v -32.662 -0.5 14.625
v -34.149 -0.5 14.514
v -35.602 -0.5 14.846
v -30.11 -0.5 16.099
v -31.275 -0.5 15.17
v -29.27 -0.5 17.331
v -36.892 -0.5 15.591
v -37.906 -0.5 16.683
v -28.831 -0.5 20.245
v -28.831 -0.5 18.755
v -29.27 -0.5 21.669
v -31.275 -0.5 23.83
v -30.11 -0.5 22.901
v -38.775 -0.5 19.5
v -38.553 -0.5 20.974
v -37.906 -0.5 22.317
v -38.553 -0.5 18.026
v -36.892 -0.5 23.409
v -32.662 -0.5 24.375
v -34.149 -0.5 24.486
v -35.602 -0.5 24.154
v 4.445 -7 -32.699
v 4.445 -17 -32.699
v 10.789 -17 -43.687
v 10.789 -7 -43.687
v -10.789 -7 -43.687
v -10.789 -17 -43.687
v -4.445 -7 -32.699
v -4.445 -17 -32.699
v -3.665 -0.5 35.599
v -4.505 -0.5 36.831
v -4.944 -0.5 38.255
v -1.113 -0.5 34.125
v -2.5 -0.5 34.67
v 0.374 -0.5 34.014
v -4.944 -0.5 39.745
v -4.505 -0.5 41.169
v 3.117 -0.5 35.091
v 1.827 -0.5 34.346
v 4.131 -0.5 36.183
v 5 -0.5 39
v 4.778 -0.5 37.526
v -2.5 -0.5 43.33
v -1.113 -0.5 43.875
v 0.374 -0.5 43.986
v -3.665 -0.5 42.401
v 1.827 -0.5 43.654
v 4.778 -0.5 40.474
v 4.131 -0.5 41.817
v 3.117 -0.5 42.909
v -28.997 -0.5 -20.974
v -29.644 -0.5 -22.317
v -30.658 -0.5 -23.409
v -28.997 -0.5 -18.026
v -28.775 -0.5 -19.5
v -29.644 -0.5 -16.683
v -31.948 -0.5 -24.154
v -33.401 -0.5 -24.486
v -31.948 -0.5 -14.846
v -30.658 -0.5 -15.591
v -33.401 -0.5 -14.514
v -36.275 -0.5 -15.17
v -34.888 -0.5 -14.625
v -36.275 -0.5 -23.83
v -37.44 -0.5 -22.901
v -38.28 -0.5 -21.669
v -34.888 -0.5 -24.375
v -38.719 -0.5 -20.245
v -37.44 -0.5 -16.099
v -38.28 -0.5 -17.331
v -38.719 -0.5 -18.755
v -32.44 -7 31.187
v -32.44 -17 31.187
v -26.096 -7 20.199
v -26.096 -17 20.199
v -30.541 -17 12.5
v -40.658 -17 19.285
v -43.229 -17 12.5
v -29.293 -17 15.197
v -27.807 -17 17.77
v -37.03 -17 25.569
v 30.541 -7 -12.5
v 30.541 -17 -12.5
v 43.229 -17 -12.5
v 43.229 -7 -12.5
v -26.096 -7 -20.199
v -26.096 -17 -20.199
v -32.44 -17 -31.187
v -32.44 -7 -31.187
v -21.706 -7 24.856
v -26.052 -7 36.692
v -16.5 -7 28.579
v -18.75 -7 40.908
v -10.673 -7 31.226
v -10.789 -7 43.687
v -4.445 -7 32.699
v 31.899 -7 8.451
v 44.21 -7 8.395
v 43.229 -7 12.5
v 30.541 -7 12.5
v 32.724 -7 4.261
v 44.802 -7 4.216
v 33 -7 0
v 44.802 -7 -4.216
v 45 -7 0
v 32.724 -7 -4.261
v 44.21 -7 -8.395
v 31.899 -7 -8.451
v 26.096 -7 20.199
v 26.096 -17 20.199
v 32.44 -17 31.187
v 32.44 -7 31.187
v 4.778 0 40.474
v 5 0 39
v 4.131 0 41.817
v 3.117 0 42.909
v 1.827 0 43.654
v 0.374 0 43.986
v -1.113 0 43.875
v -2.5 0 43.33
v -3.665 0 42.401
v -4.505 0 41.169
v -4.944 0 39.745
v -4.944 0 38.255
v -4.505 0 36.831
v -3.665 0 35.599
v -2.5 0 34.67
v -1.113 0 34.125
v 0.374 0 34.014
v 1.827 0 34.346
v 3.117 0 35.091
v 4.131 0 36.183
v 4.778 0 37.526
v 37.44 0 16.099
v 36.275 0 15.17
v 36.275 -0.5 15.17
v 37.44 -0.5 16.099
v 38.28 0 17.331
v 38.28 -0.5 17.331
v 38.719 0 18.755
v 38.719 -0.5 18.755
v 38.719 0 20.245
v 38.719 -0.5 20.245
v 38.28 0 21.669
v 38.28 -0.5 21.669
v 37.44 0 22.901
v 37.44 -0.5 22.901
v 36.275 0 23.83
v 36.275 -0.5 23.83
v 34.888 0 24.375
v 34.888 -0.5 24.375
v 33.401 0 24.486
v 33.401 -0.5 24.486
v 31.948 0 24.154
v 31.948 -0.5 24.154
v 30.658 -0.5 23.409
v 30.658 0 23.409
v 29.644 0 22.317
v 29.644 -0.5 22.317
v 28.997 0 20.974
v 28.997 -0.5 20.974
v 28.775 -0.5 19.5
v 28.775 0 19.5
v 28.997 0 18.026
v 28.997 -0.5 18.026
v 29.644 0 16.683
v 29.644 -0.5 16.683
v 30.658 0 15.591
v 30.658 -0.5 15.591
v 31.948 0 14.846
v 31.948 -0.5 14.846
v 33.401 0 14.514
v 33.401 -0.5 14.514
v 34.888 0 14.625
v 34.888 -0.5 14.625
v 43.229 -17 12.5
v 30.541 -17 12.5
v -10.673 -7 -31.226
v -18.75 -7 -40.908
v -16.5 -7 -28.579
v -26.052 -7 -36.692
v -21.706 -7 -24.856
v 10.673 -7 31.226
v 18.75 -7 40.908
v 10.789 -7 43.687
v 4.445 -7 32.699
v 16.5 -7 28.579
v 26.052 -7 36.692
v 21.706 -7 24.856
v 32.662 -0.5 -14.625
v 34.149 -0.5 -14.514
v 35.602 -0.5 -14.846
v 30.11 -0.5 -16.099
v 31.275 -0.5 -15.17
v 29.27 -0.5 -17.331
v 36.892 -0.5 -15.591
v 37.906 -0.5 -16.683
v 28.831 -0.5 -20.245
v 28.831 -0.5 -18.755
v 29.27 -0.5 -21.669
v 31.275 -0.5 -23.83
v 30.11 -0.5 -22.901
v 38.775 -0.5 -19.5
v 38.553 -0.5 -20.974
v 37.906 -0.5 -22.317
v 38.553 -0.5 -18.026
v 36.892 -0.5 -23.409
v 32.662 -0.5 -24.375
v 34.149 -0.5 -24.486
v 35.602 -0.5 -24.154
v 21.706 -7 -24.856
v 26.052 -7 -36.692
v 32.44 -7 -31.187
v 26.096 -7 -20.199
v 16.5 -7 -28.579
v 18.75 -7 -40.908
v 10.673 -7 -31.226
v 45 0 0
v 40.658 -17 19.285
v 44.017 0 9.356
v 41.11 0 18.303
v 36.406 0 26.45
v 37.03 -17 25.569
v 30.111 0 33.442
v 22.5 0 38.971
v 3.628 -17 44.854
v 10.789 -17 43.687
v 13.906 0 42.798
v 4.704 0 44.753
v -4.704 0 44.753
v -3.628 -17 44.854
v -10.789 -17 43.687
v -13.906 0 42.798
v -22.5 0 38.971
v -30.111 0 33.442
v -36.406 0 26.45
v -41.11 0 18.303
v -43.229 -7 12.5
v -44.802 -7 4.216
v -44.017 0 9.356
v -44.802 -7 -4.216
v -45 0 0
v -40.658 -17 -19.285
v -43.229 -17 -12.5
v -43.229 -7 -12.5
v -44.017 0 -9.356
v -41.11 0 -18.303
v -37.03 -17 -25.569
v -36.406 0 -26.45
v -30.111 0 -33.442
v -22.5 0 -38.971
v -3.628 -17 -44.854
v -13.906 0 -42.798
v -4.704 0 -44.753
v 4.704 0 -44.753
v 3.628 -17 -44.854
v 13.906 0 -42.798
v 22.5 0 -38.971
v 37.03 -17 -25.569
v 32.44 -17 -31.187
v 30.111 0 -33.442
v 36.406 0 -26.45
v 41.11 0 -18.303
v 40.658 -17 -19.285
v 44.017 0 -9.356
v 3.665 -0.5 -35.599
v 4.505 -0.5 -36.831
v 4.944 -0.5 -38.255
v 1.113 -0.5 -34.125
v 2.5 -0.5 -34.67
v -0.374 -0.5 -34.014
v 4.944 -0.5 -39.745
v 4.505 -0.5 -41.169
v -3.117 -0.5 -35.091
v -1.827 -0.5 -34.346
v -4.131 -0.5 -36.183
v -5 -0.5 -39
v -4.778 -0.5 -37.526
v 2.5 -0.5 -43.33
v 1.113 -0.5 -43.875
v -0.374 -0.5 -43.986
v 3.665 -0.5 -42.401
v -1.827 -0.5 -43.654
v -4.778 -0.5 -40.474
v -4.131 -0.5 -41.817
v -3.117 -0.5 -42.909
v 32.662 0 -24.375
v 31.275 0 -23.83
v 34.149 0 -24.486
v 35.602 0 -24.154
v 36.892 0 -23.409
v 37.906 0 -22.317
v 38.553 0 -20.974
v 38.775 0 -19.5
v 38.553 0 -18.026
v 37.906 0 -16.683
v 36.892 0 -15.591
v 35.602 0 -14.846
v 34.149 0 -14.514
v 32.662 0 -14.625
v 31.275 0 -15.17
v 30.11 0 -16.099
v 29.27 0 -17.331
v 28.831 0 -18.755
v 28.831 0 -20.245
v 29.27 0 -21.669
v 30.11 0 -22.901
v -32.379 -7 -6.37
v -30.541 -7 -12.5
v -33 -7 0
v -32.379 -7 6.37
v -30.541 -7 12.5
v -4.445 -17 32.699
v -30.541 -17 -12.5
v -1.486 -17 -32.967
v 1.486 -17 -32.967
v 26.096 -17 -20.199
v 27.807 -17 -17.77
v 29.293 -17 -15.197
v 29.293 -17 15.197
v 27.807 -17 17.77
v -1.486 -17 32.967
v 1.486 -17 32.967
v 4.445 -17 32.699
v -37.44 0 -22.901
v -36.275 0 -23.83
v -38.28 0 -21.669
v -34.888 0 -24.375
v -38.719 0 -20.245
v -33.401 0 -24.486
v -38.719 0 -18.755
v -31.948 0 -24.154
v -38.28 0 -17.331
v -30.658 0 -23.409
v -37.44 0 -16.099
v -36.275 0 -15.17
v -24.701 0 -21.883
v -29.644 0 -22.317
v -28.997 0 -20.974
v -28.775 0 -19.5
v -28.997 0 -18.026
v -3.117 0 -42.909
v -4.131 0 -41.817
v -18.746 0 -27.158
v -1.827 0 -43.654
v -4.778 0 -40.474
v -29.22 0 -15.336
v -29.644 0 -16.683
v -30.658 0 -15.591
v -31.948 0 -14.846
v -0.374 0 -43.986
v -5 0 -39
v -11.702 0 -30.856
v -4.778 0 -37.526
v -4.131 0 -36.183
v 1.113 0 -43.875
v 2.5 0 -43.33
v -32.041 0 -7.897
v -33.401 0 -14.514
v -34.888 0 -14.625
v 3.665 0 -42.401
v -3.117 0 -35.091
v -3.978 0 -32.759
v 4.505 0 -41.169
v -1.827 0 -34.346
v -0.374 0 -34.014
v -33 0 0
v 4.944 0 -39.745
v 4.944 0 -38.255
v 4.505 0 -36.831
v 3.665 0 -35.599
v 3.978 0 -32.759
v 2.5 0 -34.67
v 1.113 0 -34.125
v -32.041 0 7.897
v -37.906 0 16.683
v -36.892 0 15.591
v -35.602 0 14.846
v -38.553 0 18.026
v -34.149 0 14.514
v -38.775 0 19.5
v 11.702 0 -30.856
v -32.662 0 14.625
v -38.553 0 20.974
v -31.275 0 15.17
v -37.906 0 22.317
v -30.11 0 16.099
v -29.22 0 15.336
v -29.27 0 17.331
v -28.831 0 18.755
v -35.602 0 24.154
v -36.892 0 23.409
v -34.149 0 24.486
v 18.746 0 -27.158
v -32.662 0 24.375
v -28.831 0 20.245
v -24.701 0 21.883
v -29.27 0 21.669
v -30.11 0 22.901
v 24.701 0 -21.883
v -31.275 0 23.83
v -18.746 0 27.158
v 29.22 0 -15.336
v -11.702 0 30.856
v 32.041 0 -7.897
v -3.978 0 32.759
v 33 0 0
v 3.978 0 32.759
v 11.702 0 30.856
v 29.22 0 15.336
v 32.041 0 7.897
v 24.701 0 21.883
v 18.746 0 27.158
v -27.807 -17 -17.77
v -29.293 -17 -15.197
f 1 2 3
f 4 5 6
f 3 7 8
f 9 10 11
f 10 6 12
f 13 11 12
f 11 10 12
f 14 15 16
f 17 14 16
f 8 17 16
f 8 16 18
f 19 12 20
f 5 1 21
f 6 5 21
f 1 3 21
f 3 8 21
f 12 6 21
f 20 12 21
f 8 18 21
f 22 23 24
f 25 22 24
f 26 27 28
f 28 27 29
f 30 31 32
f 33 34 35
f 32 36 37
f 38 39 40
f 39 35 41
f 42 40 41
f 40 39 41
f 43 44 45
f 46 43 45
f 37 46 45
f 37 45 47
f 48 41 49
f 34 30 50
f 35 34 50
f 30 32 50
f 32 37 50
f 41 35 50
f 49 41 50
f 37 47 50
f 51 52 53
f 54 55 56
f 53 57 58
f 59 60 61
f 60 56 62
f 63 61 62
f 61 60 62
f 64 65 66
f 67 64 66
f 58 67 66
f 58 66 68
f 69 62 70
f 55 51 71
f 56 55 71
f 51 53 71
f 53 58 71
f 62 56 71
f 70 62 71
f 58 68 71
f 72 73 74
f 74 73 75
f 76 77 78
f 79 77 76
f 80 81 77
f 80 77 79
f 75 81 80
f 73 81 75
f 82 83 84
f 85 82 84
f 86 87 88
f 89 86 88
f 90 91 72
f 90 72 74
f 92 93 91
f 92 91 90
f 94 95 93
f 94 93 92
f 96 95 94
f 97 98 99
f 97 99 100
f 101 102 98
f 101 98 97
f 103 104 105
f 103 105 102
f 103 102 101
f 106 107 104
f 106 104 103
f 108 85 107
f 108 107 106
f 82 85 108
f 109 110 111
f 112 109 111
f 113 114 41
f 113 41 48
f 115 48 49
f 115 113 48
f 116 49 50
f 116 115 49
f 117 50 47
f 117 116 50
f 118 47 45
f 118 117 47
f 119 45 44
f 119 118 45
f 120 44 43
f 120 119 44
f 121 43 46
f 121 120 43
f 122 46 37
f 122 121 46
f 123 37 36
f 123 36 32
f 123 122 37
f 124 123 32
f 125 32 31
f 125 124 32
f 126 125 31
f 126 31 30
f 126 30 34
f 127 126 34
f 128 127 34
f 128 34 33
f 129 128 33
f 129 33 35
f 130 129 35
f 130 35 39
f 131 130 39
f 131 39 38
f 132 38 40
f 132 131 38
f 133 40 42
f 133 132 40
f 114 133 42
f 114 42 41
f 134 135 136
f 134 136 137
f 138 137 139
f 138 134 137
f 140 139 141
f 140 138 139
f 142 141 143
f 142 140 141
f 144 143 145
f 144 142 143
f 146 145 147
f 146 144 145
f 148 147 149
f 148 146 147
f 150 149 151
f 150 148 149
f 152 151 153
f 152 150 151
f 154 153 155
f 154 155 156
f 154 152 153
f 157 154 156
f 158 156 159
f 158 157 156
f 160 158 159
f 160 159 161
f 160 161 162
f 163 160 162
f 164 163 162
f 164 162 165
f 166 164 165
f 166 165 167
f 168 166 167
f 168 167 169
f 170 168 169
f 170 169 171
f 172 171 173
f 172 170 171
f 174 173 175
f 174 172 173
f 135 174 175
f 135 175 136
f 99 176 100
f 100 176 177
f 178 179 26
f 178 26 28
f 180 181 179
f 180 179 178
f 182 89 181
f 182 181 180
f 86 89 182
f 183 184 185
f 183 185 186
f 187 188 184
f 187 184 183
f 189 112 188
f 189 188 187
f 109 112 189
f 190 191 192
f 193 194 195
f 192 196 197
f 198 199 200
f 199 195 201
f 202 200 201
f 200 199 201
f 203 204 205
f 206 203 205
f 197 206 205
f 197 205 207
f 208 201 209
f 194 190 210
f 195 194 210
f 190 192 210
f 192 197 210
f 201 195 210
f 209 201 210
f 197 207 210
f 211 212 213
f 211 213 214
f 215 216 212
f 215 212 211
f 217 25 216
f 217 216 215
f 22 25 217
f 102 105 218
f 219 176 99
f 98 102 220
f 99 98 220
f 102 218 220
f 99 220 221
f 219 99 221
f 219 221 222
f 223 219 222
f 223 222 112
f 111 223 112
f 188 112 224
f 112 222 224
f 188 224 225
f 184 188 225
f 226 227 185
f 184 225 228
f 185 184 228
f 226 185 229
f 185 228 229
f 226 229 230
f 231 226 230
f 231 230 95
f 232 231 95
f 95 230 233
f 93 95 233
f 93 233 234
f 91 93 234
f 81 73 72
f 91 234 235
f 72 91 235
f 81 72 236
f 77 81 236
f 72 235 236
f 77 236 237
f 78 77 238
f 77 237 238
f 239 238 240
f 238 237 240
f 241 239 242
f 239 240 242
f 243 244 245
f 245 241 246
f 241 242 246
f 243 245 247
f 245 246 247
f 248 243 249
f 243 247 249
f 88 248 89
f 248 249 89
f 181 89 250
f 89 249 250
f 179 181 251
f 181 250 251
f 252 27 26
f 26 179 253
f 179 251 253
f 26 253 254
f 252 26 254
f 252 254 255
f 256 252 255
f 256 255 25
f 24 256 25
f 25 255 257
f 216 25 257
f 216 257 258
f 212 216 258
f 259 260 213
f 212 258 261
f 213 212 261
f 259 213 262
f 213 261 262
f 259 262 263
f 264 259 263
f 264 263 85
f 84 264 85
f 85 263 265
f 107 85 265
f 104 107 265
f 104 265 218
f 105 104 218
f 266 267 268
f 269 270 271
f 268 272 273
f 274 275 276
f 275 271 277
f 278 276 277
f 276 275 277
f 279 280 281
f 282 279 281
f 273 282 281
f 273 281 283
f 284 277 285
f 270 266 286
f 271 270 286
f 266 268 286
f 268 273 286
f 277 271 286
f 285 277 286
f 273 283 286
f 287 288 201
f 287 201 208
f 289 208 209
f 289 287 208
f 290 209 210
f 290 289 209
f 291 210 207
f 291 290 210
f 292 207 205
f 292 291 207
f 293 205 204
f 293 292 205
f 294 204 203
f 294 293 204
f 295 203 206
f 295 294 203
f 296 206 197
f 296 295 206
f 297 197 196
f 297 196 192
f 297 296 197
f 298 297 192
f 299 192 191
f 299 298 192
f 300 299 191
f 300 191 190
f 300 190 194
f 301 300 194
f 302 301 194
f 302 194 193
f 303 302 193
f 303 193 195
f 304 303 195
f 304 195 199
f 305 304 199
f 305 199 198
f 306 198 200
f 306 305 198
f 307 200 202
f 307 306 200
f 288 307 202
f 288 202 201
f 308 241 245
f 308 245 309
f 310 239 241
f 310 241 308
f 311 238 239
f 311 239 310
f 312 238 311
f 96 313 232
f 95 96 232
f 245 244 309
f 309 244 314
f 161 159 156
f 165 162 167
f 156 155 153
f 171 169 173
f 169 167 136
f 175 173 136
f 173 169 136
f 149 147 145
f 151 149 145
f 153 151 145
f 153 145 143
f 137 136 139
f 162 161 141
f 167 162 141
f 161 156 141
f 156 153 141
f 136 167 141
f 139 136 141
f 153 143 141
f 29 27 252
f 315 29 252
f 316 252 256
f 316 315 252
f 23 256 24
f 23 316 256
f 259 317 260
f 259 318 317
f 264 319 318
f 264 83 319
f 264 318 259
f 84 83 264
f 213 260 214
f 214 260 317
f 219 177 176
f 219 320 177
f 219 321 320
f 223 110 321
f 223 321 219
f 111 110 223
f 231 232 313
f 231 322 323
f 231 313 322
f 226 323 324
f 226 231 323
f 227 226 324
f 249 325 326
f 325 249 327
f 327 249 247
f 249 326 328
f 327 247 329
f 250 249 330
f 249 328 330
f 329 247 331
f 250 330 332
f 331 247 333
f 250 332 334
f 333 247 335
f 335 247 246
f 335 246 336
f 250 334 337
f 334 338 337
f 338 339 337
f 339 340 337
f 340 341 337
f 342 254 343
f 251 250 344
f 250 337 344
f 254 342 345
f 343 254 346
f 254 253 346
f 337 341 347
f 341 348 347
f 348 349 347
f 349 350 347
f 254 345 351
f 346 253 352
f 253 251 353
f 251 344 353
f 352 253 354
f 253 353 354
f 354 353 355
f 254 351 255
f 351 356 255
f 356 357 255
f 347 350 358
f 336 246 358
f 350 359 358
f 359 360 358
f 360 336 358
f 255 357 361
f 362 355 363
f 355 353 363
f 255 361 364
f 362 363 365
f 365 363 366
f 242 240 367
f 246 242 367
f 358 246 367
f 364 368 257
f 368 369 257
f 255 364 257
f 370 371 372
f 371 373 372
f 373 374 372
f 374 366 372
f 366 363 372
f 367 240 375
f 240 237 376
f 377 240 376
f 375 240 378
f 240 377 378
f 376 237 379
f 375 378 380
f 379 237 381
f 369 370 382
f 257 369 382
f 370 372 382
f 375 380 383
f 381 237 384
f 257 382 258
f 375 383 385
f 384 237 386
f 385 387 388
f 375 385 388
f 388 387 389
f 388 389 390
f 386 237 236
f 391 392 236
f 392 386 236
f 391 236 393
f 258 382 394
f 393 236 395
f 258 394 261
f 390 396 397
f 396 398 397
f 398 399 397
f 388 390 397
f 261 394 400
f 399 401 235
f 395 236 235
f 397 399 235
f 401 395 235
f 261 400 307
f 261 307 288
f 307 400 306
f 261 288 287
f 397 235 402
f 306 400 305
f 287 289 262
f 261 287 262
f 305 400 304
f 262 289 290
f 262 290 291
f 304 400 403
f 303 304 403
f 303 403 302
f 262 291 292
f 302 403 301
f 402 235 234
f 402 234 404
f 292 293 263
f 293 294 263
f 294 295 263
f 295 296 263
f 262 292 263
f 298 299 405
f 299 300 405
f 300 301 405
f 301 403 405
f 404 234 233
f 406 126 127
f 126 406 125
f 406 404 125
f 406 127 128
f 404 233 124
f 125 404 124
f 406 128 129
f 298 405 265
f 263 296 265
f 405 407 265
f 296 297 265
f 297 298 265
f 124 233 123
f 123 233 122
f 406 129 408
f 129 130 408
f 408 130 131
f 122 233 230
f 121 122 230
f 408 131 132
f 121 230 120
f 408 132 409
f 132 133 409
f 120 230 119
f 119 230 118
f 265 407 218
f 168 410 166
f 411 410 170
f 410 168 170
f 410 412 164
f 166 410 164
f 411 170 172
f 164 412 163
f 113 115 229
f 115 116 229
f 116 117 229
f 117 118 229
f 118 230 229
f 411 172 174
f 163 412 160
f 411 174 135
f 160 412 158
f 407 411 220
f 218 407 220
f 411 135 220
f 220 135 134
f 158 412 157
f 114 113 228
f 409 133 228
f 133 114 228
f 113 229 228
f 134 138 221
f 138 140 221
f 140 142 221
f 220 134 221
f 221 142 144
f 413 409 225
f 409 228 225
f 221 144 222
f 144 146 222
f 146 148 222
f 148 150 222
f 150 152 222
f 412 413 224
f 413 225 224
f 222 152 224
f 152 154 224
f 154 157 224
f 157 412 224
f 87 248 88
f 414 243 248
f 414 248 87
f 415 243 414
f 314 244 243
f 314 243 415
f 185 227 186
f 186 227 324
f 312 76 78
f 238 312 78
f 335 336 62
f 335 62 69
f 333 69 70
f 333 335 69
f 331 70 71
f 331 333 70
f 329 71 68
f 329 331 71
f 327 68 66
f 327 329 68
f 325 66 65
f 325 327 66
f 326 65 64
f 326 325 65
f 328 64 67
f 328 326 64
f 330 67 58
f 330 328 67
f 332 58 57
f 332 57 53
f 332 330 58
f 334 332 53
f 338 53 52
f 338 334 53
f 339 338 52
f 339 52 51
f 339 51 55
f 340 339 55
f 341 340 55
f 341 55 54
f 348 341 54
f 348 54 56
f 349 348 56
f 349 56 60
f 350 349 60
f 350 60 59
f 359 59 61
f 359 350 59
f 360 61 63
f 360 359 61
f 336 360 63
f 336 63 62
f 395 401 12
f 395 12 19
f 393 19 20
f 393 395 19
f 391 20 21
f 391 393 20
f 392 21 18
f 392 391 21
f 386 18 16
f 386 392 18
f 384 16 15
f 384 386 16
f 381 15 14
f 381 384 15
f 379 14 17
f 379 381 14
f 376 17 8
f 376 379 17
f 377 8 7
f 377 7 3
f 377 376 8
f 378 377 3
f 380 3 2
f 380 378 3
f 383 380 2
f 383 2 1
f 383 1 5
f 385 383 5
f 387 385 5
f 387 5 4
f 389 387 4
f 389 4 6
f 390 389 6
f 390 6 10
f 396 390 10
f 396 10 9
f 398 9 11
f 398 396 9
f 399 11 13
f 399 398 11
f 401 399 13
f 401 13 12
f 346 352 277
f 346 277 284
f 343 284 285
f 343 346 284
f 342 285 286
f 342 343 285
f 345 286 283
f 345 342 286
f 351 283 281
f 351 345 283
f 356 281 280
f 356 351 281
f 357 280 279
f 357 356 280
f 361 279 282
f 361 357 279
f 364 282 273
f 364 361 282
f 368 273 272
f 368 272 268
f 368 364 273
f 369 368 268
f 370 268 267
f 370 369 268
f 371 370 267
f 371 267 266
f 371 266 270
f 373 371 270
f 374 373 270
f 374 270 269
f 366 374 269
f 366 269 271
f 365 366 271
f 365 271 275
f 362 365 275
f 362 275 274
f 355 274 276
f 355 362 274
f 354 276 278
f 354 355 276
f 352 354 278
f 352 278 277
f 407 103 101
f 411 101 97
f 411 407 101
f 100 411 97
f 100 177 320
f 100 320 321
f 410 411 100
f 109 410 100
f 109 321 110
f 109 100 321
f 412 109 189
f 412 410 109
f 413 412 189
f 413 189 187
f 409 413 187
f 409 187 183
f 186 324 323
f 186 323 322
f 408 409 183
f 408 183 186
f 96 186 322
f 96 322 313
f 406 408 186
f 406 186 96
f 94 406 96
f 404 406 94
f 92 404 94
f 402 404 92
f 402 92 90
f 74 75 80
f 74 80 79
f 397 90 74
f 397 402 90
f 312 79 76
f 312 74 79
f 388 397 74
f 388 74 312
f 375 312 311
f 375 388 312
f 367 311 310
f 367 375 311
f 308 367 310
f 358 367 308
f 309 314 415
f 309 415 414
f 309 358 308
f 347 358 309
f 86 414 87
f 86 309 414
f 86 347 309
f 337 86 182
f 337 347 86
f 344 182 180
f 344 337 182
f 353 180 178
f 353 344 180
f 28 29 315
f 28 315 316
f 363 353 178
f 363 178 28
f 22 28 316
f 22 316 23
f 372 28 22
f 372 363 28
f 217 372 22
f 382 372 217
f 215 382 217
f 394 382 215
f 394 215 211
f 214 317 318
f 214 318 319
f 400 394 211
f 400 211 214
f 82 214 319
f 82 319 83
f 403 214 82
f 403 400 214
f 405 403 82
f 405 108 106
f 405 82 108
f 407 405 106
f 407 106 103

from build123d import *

# Parameters (mm, degrees)
F0_R            = 45
F0_R_2          = 33
F1_DEPTH        = 17
F2_R            = 5
F3_DEPTH        = 0.5
F3_COPIES_COUNT = 6
F6_DEPTH        = 10
F8_COUNT        = 6


# Not quite as in the source:
# - a pattern or mirror of a feature is missing from the dataset's text; its kind, count and spacing are read off the source's solid


with BuildPart() as f1:
    # F0 (on Front) → F1 (new body)
    with BuildSketch(Plane.XZ):
        Circle(F0_R)
        Circle(F0_R_2, mode=Mode.SUBTRACT)
    extrude(amount=F1_DEPTH)

    # F2 (on Front) → F3 (cut)
    with BuildSketch(Plane.XZ):
        with Locations((0, 39)):
            Circle(F2_R)
    f3 = extrude(amount=F3_DEPTH, mode=Mode.SUBTRACT)

    # F3_copies: F3 ×6 about axis
    f3_copies_axis = Axis((0, 0, 0), (0, 1, 0))
    for i in range(1, F3_COPIES_COUNT):
        add(f3.rotate(f3_copies_axis, i * 360 / F3_COPIES_COUNT), mode=Mode.SUBTRACT)

    # F5 (on face) → F6 (cut)
    with BuildSketch(Plane.XZ.offset(17)):
        with BuildLine():
            Line((-30.5409561082, 12.5), (-43.2290411645, 12.5))
            ThreePointArc((-43.2290411645, 12.5), (-45, 0), (-43.2290411645, -12.5))
            Line((-43.2290411645, -12.5), (-30.5409561082, -12.5))
            ThreePointArc((-30.5409561082, -12.5), (-33, 0), (-30.5409561082, 12.5))
        make_face()
    f6 = extrude(amount=-F6_DEPTH, mode=Mode.SUBTRACT)

    # F8: F6 ×6 about axis
    f8_axis = Axis((0, -20.116, 0), (0, -1, 0))
    for i in range(1, F8_COUNT):
        add(f6.rotate(f8_axis, i * 360 / F8_COUNT), mode=Mode.SUBTRACT)


solid = f1.part
